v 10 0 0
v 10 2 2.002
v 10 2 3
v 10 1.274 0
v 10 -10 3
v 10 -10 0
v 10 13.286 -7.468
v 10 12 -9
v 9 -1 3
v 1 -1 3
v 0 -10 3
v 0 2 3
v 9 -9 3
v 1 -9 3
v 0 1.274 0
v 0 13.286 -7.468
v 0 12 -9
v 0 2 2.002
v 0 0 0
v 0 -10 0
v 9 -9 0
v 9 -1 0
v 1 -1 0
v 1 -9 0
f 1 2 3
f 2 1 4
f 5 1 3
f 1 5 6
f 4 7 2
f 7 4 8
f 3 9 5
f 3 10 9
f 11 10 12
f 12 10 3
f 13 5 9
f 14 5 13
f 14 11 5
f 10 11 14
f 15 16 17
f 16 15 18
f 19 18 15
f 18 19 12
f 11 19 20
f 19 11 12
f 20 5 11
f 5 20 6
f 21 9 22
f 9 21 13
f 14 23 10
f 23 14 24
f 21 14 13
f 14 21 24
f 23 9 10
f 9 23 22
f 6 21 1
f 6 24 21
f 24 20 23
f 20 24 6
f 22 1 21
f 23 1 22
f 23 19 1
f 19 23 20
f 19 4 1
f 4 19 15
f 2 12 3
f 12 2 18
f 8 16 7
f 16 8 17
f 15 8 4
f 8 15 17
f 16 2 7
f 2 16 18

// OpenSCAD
union(){
    cube(size=[10, 2, 3]);
    translate(v=[0, 12, -9]){
        rotate(a=[50, 0, 0]){
            cube(size=[10, 2, 16]);
        };
    };
    difference(){
        translate(v=[0, 0, 3]){
            rotate(a=[180, 0, 0]){
                difference(){
                    union(){
                        difference(){
                            cube(size=[10, 10, 12]);
                            translate(v=[1, 1, 0]){
                                cube(size=[8, 8, 12]);
                            };
                        };
                        translate(v=[1, 1, 3]){
                            difference(){
                                cube(size=[8, 8, 12]);
                                translate(v=[1, 1, 0]){
                                    cube(size=[6, 6, 12]);
                                };
                            };
                        };
                    };
                    union(){
                        translate(v=[7, 7, 12]){
                            cube(size=[3, 3, 5]);
                        };
                        translate(v=[0, 0, 12]){
                            cube(size=[3, 3, 5]);
                        };
                        translate(v=[0, 7, 12]){
                            cube(size=[3, 3, 5]);
                        };
                        translate(v=[7, 0, 12]){
                            cube(size=[3, 3, 5]);
                        };
                    };
                };
            };
        };
        translate(v=[-1, -11, -20]){
            cube(size=[20, 20, 20]);
        };
    };
};
